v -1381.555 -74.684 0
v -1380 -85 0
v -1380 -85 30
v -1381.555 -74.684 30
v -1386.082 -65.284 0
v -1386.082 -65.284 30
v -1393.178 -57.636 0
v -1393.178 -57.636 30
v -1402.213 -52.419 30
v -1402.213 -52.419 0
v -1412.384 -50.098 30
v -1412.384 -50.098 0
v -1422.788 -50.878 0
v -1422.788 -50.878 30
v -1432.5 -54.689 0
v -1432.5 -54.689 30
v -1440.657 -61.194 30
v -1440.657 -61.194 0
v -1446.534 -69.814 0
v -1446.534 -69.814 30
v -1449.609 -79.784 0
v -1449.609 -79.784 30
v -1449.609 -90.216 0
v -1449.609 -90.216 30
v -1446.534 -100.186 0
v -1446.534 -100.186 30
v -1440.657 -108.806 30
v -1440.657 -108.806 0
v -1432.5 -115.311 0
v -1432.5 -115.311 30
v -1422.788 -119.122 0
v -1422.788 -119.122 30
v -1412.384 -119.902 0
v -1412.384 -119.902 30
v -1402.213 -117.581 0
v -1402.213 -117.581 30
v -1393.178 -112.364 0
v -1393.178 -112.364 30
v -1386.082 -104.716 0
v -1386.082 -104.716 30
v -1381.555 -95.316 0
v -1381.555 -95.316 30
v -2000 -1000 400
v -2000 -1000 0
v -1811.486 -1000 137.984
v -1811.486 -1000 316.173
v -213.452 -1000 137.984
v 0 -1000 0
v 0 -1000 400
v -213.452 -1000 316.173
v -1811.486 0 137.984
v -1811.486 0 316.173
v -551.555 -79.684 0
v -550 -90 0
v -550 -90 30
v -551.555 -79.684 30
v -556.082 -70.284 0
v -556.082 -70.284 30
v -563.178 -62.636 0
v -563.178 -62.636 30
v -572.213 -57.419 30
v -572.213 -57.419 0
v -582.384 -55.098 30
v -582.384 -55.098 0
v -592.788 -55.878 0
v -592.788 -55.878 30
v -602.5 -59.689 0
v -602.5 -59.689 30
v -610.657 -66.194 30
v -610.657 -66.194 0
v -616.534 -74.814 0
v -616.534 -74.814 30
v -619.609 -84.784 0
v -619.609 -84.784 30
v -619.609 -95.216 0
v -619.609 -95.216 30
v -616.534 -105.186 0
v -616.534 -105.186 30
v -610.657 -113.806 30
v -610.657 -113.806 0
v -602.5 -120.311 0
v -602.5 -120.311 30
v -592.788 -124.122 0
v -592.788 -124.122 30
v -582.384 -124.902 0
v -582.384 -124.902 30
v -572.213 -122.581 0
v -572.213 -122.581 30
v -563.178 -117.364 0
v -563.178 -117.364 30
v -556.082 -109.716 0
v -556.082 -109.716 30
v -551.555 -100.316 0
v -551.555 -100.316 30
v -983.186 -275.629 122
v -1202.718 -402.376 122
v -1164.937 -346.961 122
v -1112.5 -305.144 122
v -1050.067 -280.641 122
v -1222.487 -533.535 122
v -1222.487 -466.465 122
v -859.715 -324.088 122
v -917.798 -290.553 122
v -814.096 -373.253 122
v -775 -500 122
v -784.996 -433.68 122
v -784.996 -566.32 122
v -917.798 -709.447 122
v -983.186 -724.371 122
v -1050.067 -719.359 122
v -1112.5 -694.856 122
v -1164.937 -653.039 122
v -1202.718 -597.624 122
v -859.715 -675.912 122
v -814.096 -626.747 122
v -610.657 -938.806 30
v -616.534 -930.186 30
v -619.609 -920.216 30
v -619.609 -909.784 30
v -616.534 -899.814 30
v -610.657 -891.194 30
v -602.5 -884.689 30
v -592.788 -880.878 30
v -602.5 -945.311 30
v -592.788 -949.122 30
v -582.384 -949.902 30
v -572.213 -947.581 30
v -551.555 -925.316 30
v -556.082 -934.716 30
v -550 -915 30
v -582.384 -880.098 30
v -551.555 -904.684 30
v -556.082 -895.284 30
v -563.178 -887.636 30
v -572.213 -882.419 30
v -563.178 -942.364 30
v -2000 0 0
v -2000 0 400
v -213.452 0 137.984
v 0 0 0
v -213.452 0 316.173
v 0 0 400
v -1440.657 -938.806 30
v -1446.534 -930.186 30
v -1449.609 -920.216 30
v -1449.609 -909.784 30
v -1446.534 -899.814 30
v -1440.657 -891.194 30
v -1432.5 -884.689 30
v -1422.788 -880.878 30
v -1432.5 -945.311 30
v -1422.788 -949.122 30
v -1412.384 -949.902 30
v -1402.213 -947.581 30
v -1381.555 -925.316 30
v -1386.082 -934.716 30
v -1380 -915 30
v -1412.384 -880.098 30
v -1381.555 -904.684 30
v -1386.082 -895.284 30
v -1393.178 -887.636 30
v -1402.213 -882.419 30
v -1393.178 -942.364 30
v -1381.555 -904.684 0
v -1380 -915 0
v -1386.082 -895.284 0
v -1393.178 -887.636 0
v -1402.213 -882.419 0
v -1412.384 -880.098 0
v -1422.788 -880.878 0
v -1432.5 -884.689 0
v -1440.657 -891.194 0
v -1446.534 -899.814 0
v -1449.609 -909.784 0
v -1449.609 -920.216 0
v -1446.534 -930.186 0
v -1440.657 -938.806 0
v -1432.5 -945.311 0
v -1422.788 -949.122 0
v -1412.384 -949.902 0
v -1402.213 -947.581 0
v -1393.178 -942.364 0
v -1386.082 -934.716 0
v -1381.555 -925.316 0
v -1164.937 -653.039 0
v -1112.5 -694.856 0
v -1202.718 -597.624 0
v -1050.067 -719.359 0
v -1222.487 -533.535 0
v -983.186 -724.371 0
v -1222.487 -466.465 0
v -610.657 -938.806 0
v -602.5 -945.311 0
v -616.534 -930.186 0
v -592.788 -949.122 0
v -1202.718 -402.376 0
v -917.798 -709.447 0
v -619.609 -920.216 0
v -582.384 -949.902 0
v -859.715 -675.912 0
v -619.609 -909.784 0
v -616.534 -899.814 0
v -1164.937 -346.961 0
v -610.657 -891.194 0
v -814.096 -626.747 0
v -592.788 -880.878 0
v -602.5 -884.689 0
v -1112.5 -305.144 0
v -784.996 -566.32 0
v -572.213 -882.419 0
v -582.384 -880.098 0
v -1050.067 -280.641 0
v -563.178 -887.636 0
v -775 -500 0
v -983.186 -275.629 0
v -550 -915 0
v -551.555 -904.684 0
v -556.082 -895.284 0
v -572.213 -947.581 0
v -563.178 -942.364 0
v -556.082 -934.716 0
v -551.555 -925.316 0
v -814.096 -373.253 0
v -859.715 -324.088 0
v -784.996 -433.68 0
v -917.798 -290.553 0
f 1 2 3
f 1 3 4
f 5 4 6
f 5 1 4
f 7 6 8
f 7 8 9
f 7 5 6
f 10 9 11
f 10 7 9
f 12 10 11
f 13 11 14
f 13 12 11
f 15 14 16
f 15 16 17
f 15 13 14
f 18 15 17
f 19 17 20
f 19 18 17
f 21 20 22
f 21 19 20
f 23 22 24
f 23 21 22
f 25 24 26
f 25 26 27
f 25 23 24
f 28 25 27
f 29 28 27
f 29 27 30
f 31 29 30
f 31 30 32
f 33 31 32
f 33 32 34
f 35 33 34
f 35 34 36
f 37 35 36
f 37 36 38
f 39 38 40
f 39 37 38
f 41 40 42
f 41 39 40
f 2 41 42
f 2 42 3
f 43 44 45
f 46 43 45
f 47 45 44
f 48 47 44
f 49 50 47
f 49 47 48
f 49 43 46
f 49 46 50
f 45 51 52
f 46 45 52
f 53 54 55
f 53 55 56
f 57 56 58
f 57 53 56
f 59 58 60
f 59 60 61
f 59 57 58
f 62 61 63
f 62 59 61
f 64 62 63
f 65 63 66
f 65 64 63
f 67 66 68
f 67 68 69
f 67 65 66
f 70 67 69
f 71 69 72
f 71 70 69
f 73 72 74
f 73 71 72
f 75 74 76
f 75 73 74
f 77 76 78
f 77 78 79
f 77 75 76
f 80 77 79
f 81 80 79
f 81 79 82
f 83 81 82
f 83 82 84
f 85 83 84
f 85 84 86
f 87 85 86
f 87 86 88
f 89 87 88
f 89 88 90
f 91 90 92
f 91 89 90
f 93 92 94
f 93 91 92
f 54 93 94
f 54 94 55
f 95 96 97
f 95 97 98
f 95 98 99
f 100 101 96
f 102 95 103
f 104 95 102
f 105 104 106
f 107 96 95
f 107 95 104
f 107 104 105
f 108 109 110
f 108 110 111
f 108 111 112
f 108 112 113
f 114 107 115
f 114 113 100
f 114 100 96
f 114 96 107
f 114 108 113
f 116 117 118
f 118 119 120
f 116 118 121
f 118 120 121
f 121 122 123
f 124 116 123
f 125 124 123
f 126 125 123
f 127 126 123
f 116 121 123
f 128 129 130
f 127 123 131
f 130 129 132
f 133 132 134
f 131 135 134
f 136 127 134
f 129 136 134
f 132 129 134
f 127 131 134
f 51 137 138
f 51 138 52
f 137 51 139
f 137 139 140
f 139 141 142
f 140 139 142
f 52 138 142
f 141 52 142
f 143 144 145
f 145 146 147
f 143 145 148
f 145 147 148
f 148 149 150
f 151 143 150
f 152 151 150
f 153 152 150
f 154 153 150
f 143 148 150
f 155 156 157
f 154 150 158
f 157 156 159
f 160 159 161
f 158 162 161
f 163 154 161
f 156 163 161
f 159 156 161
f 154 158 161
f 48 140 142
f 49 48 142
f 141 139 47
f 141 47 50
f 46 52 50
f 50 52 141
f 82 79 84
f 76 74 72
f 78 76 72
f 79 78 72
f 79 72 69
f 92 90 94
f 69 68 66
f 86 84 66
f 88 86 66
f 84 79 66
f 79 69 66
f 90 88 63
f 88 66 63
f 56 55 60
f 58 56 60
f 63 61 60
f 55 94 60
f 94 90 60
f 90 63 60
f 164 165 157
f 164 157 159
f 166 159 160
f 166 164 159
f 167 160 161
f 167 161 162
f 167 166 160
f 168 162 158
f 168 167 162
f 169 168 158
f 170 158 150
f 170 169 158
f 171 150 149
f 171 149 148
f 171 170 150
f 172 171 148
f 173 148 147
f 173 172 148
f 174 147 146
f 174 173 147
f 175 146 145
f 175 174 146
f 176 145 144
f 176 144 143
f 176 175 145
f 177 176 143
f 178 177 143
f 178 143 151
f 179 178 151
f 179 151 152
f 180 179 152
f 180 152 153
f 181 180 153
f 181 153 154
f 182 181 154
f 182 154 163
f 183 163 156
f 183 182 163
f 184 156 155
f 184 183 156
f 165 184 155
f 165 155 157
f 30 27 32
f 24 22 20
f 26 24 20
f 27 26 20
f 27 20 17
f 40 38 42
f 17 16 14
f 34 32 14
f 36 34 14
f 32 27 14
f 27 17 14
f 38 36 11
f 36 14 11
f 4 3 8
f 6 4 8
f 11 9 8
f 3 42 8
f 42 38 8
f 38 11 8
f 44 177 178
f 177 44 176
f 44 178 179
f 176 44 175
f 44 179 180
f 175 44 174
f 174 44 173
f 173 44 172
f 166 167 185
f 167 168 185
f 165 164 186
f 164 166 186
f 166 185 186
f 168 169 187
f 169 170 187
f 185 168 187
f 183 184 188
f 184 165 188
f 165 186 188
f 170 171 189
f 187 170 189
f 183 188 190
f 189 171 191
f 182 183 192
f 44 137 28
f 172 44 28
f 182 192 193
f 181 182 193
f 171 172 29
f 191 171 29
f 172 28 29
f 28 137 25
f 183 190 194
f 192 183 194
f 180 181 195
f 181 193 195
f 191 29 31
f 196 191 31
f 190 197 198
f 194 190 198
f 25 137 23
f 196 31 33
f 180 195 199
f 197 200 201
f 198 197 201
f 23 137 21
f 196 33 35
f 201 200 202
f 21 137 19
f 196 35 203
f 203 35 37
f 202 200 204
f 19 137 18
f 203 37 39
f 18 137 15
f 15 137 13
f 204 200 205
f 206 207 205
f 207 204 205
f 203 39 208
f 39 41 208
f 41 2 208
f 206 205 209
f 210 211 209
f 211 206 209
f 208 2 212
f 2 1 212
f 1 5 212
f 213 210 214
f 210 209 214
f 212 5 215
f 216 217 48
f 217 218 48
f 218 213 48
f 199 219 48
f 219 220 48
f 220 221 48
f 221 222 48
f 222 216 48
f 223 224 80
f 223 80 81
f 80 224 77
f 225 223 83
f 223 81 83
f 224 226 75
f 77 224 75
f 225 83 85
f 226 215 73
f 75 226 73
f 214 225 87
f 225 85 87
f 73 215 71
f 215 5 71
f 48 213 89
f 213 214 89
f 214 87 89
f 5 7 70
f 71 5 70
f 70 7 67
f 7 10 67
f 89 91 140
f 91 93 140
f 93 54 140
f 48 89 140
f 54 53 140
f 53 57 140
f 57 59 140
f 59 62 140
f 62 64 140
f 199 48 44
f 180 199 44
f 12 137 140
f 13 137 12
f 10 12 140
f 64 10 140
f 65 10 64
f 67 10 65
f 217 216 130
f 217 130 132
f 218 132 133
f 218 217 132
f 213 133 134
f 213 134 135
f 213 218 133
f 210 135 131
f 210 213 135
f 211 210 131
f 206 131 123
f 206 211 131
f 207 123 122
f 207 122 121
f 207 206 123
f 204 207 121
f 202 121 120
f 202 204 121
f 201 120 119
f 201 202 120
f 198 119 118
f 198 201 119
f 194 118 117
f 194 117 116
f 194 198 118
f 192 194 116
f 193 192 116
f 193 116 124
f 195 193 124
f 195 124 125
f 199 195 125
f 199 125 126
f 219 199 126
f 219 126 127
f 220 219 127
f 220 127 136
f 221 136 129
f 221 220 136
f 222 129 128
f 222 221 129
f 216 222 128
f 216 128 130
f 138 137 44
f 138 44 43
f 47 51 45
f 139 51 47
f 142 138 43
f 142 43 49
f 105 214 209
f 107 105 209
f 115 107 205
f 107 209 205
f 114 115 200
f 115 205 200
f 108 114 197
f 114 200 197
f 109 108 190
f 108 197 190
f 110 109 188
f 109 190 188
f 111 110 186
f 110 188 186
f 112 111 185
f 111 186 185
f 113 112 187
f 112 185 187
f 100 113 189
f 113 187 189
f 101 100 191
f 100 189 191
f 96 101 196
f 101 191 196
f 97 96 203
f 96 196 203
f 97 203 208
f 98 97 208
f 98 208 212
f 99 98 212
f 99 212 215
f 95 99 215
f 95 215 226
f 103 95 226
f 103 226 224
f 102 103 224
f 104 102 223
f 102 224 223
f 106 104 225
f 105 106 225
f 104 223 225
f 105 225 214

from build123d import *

# Parameters (mm, degrees)
F0_W      = 2000
F0_H      = 425
F0_W_2    = 1598.034471
F0_H_2    = 178.189233
F1_DEPTH  = 1000
F1_FACE_W = 2000
F1_FACE_H = 1000
F2_DEPTH  = 25
F3_R      = 35
F4_DEPTH  = 30
F5_R      = 225
F6_DEPTH  = 122


with BuildPart() as f1:
    # F0 (on Front) → F1 (new body)
    with BuildSketch(Plane.XZ):
        with Locations((-1000, 212.5)):
            Rectangle(F0_W, F0_H)
        with Locations((-1012.46877, 227.07834)):
            Rectangle(F0_W_2, F0_H_2, mode=Mode.SUBTRACT)
    extrude(amount=F1_DEPTH)

    # F1_face (on face) → F2 (cut)
    with BuildSketch(Plane(origin=(-1000, -500, 425), x_dir=(1, 0, 0), z_dir=(0, 0, 1))):
        Rectangle(F1_FACE_W, F1_FACE_H)
    extrude(amount=-F2_DEPTH, mode=Mode.SUBTRACT)

    # F3 (on Top) → F4 (cut)
    with BuildSketch(Plane.XY):
        with Locations((-1415, -85)):
            Circle(F3_R)
        with Locations((-1415, -915)):
            Circle(F3_R)
        with Locations((-585, -915)):
            Circle(F3_R)
        with Locations((-585, -90)):
            Circle(F3_R)
    extrude(amount=F4_DEPTH, mode=Mode.SUBTRACT)

    # F5 (on face) → F6 (cut)
    with BuildSketch(Plane(origin=(0, 0, 0), x_dir=(1, 0, 0), z_dir=(0, 0, -1))):
        with Locations((-1000, 500)):
            Circle(F5_R)
    extrude(amount=-F6_DEPTH, mode=Mode.SUBTRACT)


solid = f1.part
